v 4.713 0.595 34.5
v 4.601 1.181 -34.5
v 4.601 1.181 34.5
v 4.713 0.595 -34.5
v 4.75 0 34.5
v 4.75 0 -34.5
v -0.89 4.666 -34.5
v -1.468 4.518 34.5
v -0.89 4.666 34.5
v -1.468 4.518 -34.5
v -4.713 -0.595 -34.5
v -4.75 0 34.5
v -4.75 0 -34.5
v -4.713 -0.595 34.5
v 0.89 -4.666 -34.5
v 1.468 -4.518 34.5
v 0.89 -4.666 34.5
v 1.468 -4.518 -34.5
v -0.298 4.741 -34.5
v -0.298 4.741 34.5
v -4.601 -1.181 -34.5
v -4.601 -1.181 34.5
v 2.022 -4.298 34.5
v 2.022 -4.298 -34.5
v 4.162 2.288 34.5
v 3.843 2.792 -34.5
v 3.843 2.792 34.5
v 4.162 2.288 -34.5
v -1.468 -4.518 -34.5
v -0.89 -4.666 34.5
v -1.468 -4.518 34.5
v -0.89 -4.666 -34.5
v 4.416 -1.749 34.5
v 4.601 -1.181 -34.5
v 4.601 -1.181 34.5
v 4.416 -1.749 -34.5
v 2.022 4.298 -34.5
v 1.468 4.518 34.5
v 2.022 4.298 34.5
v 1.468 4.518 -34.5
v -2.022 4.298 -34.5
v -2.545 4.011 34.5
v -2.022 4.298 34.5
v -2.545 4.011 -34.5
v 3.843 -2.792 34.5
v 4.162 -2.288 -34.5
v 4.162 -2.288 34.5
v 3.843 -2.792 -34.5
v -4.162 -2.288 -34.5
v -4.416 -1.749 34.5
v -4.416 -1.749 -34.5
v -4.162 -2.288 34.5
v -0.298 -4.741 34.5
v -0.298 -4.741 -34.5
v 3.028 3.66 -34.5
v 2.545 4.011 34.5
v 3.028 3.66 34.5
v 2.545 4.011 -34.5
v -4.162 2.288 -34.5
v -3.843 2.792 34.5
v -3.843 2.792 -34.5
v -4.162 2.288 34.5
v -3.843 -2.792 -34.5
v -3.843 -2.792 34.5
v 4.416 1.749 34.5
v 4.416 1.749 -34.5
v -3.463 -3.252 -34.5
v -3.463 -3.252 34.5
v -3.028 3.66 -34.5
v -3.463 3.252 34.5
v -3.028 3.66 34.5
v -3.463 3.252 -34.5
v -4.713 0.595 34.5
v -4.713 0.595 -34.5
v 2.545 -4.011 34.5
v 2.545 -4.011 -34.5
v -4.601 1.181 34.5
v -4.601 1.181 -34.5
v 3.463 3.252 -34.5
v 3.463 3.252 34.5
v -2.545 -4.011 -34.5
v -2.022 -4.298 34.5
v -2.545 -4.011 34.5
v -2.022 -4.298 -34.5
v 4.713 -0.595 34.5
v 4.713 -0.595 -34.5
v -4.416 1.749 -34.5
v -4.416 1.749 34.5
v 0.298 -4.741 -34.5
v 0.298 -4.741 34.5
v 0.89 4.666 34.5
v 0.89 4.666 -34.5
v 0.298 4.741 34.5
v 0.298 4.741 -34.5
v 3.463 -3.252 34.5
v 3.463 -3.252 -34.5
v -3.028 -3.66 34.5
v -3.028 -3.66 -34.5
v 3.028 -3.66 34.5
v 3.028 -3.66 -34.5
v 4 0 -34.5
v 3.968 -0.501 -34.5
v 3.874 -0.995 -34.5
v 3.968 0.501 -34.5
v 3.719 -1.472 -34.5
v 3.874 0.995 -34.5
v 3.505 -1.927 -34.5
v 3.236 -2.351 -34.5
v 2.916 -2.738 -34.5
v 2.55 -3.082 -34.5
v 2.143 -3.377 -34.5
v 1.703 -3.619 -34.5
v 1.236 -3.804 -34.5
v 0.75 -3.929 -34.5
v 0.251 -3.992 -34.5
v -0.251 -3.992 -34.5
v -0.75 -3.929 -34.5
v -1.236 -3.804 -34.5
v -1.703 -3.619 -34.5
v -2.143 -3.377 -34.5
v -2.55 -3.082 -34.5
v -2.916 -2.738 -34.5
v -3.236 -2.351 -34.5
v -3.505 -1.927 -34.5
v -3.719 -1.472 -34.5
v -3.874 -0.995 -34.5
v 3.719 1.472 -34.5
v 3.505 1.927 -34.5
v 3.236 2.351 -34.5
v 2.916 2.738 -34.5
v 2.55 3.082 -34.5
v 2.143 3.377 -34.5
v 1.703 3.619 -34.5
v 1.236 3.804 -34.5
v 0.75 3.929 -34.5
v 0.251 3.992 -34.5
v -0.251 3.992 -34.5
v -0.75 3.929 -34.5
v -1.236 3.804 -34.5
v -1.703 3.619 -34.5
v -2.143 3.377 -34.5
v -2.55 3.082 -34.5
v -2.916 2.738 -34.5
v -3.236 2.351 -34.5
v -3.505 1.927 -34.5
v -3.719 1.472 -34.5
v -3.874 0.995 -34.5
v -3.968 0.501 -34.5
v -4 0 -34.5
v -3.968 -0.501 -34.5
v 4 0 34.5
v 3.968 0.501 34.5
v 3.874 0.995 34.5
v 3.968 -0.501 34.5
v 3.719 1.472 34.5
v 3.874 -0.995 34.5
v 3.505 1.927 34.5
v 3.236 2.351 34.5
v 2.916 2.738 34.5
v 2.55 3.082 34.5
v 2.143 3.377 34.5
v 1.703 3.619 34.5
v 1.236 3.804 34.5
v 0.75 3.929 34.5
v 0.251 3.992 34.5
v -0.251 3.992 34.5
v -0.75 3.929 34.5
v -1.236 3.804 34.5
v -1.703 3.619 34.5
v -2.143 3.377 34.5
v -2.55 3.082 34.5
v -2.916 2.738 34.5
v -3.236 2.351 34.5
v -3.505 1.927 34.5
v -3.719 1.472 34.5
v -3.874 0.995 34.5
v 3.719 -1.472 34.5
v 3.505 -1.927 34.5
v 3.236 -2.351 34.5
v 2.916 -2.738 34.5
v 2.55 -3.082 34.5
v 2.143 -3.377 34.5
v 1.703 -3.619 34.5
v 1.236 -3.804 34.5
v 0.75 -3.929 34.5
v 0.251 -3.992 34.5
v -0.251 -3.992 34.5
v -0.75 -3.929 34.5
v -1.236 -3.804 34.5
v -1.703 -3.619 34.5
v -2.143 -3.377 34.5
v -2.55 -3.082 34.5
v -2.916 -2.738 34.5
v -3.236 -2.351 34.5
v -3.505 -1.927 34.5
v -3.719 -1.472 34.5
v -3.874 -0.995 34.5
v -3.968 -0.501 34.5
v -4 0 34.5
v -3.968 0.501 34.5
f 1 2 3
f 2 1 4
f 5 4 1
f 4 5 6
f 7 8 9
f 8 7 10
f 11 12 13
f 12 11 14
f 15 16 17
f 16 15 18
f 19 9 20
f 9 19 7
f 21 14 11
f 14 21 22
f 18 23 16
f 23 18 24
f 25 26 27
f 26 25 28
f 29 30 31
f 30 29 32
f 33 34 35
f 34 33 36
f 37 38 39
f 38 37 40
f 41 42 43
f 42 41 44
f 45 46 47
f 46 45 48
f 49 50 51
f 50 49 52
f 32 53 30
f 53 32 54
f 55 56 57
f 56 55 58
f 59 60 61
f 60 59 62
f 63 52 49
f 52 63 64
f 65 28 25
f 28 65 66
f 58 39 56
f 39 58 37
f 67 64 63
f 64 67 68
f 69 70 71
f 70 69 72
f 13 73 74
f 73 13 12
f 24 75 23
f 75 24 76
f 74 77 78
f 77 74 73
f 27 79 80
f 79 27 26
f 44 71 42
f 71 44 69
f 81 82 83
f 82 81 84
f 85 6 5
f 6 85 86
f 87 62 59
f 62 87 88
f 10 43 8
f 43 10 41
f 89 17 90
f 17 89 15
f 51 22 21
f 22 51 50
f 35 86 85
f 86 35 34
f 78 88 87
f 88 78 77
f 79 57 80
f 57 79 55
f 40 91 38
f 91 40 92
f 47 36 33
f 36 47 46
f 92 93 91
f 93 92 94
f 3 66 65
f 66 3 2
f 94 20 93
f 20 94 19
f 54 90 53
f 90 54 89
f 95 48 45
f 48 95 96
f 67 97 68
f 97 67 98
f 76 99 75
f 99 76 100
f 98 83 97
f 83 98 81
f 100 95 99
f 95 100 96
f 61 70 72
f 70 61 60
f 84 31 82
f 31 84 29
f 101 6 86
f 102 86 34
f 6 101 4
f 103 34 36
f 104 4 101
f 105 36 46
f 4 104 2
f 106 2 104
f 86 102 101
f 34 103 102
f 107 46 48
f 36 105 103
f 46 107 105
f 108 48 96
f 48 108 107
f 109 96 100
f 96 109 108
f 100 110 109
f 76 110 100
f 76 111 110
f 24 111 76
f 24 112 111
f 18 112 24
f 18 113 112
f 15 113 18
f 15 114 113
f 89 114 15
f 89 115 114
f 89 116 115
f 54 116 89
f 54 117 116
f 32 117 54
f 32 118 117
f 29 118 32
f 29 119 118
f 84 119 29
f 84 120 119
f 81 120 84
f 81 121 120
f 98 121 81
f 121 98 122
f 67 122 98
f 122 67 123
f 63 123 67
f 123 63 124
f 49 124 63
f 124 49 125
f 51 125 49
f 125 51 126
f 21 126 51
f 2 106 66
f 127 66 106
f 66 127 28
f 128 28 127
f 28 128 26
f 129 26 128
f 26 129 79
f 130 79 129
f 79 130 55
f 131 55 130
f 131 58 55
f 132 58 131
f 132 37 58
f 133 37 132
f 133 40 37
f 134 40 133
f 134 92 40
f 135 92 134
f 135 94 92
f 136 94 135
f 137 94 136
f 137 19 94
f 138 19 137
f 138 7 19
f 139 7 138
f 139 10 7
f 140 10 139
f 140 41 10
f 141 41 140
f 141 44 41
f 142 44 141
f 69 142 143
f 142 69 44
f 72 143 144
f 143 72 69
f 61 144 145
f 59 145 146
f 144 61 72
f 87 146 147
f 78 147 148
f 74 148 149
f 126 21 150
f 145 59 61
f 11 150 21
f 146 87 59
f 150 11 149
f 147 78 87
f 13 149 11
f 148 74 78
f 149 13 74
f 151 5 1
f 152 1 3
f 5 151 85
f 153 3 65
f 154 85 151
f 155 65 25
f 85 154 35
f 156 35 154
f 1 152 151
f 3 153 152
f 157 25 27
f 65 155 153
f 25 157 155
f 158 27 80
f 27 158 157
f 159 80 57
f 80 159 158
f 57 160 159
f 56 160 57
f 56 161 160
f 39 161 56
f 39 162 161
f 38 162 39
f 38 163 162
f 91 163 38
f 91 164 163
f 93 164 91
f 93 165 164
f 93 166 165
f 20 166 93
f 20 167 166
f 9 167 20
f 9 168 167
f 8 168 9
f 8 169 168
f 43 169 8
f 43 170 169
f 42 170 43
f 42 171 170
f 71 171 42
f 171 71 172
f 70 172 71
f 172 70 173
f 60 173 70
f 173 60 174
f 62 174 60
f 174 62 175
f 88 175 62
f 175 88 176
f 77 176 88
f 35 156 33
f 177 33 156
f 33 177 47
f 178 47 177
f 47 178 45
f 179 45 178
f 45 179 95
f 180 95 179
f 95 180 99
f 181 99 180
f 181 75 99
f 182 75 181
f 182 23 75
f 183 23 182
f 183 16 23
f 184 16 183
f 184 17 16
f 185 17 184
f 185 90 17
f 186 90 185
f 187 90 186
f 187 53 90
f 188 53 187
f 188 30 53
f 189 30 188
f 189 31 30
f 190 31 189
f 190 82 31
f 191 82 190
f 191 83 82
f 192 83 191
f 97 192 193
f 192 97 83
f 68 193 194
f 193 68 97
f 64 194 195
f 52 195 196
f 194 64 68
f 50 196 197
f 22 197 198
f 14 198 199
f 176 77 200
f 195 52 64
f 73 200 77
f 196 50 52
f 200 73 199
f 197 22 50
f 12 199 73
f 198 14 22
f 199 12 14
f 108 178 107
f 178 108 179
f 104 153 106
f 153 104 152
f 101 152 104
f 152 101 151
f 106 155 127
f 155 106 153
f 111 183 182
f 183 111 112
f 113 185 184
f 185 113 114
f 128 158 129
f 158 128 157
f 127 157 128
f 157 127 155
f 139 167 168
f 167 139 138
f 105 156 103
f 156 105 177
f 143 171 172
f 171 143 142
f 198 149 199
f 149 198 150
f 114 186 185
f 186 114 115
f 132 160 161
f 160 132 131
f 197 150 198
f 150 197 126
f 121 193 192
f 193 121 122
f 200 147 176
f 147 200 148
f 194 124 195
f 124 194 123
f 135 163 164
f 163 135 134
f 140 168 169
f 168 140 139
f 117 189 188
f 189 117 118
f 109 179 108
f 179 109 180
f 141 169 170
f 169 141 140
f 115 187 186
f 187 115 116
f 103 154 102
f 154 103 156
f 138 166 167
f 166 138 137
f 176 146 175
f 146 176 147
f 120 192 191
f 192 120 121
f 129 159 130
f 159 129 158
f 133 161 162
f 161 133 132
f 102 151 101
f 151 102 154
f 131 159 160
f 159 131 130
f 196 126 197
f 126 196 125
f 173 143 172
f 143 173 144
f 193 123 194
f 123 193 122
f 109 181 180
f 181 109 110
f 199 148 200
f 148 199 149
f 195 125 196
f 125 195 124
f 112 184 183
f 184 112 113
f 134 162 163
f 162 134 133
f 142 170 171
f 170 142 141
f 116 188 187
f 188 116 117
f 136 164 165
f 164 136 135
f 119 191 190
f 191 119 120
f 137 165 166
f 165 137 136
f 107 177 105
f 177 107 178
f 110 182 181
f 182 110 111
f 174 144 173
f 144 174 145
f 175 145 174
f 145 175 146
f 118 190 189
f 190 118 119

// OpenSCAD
$fn = 50;


difference() {
	union() {
		translate(v = [0, 0, -34.5000000000]) {
			cylinder(h = 69, r = 4.7500000000);
		}
	}
	union() {
		translate(v = [0, 0, -100.0000000000]) {
			cylinder(h = 200, r = 4.0000000000);
		}
	}
}
